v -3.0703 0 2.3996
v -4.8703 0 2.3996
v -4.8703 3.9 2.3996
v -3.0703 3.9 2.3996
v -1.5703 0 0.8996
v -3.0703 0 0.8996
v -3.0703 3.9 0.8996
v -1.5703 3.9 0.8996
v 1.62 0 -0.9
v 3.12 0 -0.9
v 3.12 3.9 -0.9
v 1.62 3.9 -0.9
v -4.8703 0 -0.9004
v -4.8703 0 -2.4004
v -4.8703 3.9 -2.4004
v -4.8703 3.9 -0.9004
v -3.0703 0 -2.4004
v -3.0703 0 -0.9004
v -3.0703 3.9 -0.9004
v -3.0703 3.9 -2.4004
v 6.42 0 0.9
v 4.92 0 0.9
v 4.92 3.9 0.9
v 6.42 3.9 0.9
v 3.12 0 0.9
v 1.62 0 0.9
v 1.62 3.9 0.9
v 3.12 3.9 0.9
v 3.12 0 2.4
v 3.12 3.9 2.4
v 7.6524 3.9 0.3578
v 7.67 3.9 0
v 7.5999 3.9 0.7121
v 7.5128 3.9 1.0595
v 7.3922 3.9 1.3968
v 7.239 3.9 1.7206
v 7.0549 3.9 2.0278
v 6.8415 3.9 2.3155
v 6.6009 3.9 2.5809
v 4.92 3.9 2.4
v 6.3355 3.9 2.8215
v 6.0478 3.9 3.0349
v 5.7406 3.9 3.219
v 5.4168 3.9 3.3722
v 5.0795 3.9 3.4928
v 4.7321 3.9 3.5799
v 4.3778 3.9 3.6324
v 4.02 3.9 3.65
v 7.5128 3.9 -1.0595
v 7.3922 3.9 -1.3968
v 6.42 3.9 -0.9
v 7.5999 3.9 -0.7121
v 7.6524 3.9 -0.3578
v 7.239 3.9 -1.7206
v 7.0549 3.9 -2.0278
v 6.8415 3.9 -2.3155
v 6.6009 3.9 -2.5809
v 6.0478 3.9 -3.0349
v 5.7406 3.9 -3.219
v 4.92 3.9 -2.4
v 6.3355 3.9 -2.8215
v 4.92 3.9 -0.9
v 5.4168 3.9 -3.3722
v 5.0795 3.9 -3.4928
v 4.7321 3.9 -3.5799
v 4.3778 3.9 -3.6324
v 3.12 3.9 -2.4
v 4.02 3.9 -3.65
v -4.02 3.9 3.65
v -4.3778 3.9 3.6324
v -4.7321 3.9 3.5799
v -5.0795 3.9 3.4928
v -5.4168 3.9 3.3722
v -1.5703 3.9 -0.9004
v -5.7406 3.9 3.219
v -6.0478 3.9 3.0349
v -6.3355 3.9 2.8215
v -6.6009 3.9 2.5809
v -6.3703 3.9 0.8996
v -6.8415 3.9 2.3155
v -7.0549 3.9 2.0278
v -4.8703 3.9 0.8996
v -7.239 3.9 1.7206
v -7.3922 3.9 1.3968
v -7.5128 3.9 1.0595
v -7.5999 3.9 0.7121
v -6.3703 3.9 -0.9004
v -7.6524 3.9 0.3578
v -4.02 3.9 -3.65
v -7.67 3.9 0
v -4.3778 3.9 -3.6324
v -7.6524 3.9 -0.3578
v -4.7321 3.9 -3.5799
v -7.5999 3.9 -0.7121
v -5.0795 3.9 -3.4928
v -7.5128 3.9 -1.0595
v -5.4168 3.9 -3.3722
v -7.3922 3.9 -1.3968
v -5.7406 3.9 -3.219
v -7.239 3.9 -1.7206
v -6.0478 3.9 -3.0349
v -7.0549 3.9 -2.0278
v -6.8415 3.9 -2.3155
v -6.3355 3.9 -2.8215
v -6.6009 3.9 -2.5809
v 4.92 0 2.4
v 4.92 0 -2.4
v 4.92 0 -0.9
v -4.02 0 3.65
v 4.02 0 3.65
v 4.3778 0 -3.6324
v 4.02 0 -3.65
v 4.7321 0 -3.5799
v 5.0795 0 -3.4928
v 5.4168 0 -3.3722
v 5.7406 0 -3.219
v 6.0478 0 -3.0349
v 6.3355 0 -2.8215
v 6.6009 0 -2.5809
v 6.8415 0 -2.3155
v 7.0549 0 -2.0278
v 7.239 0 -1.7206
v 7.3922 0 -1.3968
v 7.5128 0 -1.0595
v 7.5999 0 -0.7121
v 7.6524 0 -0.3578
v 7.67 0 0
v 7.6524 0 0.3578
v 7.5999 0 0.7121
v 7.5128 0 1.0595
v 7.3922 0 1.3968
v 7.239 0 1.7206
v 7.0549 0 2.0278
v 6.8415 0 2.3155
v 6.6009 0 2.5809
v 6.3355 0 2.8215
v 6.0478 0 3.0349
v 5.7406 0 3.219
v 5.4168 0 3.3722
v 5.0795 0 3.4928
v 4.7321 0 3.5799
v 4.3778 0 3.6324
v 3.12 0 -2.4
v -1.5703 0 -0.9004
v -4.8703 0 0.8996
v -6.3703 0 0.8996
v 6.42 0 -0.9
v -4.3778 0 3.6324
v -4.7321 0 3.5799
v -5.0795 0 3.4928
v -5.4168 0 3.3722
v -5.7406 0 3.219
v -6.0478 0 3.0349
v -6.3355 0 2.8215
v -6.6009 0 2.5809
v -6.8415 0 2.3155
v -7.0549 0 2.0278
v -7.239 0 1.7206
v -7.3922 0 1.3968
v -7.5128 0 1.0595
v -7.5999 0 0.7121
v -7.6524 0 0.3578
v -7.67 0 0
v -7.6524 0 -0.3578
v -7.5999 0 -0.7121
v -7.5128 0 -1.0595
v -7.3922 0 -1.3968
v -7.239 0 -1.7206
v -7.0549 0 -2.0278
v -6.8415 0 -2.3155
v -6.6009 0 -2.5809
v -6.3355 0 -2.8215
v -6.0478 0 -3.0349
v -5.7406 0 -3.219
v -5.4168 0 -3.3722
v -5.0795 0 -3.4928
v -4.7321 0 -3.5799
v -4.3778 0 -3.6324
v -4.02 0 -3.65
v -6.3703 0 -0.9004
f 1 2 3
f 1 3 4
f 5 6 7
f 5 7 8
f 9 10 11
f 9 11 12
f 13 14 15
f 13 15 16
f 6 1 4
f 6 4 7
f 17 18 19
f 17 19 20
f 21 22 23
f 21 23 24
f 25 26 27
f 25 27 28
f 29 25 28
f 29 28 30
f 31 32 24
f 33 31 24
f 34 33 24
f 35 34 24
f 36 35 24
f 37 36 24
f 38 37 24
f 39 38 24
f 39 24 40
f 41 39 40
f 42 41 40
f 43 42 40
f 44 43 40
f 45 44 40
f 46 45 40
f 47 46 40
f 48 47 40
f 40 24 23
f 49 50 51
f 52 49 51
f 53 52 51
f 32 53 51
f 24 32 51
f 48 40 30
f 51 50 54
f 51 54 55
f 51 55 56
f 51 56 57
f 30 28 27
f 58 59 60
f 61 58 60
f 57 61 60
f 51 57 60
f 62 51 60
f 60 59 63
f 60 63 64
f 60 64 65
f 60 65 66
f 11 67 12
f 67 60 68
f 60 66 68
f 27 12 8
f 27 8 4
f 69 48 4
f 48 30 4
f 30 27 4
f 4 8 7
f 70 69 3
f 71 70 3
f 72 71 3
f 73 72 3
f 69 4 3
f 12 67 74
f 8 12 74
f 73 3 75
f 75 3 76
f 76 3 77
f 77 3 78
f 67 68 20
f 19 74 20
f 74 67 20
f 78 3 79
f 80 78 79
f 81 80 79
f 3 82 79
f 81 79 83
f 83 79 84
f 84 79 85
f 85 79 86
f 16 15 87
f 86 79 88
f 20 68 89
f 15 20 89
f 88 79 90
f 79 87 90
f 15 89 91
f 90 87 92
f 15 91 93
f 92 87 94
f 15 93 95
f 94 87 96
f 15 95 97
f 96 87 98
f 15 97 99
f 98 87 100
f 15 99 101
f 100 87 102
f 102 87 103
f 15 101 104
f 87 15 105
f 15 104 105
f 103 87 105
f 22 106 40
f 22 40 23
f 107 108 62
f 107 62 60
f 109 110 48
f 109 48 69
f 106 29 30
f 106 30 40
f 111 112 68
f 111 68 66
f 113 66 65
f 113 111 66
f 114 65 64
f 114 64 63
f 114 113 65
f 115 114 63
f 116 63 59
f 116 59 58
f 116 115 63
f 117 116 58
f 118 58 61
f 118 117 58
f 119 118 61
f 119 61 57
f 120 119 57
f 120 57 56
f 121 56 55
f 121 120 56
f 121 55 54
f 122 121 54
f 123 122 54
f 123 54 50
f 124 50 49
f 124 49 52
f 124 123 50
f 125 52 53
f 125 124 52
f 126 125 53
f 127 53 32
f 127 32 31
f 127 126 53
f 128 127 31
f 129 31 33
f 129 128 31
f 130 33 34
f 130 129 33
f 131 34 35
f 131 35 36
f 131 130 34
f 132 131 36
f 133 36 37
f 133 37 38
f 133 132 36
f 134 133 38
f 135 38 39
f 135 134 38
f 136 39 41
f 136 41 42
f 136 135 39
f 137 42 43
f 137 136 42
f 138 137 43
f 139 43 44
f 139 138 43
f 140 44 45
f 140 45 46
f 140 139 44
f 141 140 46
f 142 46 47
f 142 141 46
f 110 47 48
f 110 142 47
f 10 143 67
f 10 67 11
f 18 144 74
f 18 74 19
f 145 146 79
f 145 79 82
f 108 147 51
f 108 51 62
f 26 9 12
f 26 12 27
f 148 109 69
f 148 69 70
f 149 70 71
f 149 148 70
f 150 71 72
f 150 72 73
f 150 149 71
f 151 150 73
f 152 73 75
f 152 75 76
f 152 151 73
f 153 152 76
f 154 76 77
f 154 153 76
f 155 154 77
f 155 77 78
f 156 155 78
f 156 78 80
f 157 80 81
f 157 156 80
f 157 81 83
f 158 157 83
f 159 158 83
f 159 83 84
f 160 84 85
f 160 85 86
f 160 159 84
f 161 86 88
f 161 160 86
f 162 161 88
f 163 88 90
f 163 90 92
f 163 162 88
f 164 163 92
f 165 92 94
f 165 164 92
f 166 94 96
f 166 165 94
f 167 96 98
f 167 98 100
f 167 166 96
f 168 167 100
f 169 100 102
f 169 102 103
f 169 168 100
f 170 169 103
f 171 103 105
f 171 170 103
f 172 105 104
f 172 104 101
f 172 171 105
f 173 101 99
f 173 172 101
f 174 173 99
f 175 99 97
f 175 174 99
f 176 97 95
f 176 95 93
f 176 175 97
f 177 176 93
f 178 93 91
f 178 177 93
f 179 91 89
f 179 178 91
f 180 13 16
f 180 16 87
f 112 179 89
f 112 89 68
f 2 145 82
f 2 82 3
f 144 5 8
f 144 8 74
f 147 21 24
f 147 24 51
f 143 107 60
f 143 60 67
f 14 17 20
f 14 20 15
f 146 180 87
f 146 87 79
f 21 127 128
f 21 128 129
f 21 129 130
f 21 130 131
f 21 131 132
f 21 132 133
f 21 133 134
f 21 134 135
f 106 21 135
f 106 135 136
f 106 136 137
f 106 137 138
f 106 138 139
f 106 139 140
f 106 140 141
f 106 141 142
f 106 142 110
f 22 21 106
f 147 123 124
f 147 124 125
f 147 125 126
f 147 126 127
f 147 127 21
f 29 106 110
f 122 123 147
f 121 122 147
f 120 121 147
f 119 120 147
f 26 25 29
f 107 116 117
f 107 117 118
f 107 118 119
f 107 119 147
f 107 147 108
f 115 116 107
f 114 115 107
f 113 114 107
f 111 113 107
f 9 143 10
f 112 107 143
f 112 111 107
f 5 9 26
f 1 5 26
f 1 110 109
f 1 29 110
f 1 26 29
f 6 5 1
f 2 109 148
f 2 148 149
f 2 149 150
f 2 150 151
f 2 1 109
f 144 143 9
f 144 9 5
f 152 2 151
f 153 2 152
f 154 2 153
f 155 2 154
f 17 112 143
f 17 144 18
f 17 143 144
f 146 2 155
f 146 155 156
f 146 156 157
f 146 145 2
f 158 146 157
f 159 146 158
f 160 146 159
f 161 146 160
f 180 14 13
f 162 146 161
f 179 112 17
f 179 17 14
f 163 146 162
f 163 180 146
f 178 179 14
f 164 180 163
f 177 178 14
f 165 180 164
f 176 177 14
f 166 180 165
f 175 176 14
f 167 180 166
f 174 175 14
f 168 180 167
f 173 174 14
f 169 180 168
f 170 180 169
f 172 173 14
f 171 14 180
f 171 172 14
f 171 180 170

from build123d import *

# Parameters (mm, degrees)
BOSS_EXTRUDE1_DEPTH = 3.9


with BuildPart() as part:
    # Sketch1 → Boss-Extrude1 (new body)
    with BuildSketch(Plane(origin=(0, 0, 0), x_dir=(1, 0, 0), z_dir=(0, 1, 0))):
        with BuildLine():
            Line((-4.02, 3.65), (4.02, 3.65))
            ThreePointArc((4.02, 3.65), (7.67, 0), (4.02, -3.65))
            Line((4.02, -3.65), (-4.02, -3.65))
            ThreePointArc((-4.02, -3.65), (-7.67, 0), (-4.02, 3.65))
        make_face()
        Polygon((3.12, 2.4), (3.12, 0.9), (1.62, 0.9), (1.62, -0.9), (3.12, -0.9), (3.12, -2.4), (4.92, -2.4), (4.92, -0.9), (6.42, -0.9), (6.42, 0.9), (4.92, 0.9), (4.92, 2.4), align=None, mode=Mode.SUBTRACT)
        Polygon((-4.870347538, 2.400403287), (-4.870347538, 0.900403287), (-6.370347538, 0.900403287), (-6.370347538, -0.899596713), (-4.870347538, -0.899596713), (-4.870347538, -2.399596713), (-3.070347538, -2.399596713), (-3.070347538, -0.899596713), (-1.570347538, -0.899596713), (-1.570347538, 0.900403287), (-3.070347538, 0.900403287), (-3.070347538, 2.400403287), align=None, mode=Mode.SUBTRACT)
    extrude(amount=BOSS_EXTRUDE1_DEPTH)


solid = part.part
